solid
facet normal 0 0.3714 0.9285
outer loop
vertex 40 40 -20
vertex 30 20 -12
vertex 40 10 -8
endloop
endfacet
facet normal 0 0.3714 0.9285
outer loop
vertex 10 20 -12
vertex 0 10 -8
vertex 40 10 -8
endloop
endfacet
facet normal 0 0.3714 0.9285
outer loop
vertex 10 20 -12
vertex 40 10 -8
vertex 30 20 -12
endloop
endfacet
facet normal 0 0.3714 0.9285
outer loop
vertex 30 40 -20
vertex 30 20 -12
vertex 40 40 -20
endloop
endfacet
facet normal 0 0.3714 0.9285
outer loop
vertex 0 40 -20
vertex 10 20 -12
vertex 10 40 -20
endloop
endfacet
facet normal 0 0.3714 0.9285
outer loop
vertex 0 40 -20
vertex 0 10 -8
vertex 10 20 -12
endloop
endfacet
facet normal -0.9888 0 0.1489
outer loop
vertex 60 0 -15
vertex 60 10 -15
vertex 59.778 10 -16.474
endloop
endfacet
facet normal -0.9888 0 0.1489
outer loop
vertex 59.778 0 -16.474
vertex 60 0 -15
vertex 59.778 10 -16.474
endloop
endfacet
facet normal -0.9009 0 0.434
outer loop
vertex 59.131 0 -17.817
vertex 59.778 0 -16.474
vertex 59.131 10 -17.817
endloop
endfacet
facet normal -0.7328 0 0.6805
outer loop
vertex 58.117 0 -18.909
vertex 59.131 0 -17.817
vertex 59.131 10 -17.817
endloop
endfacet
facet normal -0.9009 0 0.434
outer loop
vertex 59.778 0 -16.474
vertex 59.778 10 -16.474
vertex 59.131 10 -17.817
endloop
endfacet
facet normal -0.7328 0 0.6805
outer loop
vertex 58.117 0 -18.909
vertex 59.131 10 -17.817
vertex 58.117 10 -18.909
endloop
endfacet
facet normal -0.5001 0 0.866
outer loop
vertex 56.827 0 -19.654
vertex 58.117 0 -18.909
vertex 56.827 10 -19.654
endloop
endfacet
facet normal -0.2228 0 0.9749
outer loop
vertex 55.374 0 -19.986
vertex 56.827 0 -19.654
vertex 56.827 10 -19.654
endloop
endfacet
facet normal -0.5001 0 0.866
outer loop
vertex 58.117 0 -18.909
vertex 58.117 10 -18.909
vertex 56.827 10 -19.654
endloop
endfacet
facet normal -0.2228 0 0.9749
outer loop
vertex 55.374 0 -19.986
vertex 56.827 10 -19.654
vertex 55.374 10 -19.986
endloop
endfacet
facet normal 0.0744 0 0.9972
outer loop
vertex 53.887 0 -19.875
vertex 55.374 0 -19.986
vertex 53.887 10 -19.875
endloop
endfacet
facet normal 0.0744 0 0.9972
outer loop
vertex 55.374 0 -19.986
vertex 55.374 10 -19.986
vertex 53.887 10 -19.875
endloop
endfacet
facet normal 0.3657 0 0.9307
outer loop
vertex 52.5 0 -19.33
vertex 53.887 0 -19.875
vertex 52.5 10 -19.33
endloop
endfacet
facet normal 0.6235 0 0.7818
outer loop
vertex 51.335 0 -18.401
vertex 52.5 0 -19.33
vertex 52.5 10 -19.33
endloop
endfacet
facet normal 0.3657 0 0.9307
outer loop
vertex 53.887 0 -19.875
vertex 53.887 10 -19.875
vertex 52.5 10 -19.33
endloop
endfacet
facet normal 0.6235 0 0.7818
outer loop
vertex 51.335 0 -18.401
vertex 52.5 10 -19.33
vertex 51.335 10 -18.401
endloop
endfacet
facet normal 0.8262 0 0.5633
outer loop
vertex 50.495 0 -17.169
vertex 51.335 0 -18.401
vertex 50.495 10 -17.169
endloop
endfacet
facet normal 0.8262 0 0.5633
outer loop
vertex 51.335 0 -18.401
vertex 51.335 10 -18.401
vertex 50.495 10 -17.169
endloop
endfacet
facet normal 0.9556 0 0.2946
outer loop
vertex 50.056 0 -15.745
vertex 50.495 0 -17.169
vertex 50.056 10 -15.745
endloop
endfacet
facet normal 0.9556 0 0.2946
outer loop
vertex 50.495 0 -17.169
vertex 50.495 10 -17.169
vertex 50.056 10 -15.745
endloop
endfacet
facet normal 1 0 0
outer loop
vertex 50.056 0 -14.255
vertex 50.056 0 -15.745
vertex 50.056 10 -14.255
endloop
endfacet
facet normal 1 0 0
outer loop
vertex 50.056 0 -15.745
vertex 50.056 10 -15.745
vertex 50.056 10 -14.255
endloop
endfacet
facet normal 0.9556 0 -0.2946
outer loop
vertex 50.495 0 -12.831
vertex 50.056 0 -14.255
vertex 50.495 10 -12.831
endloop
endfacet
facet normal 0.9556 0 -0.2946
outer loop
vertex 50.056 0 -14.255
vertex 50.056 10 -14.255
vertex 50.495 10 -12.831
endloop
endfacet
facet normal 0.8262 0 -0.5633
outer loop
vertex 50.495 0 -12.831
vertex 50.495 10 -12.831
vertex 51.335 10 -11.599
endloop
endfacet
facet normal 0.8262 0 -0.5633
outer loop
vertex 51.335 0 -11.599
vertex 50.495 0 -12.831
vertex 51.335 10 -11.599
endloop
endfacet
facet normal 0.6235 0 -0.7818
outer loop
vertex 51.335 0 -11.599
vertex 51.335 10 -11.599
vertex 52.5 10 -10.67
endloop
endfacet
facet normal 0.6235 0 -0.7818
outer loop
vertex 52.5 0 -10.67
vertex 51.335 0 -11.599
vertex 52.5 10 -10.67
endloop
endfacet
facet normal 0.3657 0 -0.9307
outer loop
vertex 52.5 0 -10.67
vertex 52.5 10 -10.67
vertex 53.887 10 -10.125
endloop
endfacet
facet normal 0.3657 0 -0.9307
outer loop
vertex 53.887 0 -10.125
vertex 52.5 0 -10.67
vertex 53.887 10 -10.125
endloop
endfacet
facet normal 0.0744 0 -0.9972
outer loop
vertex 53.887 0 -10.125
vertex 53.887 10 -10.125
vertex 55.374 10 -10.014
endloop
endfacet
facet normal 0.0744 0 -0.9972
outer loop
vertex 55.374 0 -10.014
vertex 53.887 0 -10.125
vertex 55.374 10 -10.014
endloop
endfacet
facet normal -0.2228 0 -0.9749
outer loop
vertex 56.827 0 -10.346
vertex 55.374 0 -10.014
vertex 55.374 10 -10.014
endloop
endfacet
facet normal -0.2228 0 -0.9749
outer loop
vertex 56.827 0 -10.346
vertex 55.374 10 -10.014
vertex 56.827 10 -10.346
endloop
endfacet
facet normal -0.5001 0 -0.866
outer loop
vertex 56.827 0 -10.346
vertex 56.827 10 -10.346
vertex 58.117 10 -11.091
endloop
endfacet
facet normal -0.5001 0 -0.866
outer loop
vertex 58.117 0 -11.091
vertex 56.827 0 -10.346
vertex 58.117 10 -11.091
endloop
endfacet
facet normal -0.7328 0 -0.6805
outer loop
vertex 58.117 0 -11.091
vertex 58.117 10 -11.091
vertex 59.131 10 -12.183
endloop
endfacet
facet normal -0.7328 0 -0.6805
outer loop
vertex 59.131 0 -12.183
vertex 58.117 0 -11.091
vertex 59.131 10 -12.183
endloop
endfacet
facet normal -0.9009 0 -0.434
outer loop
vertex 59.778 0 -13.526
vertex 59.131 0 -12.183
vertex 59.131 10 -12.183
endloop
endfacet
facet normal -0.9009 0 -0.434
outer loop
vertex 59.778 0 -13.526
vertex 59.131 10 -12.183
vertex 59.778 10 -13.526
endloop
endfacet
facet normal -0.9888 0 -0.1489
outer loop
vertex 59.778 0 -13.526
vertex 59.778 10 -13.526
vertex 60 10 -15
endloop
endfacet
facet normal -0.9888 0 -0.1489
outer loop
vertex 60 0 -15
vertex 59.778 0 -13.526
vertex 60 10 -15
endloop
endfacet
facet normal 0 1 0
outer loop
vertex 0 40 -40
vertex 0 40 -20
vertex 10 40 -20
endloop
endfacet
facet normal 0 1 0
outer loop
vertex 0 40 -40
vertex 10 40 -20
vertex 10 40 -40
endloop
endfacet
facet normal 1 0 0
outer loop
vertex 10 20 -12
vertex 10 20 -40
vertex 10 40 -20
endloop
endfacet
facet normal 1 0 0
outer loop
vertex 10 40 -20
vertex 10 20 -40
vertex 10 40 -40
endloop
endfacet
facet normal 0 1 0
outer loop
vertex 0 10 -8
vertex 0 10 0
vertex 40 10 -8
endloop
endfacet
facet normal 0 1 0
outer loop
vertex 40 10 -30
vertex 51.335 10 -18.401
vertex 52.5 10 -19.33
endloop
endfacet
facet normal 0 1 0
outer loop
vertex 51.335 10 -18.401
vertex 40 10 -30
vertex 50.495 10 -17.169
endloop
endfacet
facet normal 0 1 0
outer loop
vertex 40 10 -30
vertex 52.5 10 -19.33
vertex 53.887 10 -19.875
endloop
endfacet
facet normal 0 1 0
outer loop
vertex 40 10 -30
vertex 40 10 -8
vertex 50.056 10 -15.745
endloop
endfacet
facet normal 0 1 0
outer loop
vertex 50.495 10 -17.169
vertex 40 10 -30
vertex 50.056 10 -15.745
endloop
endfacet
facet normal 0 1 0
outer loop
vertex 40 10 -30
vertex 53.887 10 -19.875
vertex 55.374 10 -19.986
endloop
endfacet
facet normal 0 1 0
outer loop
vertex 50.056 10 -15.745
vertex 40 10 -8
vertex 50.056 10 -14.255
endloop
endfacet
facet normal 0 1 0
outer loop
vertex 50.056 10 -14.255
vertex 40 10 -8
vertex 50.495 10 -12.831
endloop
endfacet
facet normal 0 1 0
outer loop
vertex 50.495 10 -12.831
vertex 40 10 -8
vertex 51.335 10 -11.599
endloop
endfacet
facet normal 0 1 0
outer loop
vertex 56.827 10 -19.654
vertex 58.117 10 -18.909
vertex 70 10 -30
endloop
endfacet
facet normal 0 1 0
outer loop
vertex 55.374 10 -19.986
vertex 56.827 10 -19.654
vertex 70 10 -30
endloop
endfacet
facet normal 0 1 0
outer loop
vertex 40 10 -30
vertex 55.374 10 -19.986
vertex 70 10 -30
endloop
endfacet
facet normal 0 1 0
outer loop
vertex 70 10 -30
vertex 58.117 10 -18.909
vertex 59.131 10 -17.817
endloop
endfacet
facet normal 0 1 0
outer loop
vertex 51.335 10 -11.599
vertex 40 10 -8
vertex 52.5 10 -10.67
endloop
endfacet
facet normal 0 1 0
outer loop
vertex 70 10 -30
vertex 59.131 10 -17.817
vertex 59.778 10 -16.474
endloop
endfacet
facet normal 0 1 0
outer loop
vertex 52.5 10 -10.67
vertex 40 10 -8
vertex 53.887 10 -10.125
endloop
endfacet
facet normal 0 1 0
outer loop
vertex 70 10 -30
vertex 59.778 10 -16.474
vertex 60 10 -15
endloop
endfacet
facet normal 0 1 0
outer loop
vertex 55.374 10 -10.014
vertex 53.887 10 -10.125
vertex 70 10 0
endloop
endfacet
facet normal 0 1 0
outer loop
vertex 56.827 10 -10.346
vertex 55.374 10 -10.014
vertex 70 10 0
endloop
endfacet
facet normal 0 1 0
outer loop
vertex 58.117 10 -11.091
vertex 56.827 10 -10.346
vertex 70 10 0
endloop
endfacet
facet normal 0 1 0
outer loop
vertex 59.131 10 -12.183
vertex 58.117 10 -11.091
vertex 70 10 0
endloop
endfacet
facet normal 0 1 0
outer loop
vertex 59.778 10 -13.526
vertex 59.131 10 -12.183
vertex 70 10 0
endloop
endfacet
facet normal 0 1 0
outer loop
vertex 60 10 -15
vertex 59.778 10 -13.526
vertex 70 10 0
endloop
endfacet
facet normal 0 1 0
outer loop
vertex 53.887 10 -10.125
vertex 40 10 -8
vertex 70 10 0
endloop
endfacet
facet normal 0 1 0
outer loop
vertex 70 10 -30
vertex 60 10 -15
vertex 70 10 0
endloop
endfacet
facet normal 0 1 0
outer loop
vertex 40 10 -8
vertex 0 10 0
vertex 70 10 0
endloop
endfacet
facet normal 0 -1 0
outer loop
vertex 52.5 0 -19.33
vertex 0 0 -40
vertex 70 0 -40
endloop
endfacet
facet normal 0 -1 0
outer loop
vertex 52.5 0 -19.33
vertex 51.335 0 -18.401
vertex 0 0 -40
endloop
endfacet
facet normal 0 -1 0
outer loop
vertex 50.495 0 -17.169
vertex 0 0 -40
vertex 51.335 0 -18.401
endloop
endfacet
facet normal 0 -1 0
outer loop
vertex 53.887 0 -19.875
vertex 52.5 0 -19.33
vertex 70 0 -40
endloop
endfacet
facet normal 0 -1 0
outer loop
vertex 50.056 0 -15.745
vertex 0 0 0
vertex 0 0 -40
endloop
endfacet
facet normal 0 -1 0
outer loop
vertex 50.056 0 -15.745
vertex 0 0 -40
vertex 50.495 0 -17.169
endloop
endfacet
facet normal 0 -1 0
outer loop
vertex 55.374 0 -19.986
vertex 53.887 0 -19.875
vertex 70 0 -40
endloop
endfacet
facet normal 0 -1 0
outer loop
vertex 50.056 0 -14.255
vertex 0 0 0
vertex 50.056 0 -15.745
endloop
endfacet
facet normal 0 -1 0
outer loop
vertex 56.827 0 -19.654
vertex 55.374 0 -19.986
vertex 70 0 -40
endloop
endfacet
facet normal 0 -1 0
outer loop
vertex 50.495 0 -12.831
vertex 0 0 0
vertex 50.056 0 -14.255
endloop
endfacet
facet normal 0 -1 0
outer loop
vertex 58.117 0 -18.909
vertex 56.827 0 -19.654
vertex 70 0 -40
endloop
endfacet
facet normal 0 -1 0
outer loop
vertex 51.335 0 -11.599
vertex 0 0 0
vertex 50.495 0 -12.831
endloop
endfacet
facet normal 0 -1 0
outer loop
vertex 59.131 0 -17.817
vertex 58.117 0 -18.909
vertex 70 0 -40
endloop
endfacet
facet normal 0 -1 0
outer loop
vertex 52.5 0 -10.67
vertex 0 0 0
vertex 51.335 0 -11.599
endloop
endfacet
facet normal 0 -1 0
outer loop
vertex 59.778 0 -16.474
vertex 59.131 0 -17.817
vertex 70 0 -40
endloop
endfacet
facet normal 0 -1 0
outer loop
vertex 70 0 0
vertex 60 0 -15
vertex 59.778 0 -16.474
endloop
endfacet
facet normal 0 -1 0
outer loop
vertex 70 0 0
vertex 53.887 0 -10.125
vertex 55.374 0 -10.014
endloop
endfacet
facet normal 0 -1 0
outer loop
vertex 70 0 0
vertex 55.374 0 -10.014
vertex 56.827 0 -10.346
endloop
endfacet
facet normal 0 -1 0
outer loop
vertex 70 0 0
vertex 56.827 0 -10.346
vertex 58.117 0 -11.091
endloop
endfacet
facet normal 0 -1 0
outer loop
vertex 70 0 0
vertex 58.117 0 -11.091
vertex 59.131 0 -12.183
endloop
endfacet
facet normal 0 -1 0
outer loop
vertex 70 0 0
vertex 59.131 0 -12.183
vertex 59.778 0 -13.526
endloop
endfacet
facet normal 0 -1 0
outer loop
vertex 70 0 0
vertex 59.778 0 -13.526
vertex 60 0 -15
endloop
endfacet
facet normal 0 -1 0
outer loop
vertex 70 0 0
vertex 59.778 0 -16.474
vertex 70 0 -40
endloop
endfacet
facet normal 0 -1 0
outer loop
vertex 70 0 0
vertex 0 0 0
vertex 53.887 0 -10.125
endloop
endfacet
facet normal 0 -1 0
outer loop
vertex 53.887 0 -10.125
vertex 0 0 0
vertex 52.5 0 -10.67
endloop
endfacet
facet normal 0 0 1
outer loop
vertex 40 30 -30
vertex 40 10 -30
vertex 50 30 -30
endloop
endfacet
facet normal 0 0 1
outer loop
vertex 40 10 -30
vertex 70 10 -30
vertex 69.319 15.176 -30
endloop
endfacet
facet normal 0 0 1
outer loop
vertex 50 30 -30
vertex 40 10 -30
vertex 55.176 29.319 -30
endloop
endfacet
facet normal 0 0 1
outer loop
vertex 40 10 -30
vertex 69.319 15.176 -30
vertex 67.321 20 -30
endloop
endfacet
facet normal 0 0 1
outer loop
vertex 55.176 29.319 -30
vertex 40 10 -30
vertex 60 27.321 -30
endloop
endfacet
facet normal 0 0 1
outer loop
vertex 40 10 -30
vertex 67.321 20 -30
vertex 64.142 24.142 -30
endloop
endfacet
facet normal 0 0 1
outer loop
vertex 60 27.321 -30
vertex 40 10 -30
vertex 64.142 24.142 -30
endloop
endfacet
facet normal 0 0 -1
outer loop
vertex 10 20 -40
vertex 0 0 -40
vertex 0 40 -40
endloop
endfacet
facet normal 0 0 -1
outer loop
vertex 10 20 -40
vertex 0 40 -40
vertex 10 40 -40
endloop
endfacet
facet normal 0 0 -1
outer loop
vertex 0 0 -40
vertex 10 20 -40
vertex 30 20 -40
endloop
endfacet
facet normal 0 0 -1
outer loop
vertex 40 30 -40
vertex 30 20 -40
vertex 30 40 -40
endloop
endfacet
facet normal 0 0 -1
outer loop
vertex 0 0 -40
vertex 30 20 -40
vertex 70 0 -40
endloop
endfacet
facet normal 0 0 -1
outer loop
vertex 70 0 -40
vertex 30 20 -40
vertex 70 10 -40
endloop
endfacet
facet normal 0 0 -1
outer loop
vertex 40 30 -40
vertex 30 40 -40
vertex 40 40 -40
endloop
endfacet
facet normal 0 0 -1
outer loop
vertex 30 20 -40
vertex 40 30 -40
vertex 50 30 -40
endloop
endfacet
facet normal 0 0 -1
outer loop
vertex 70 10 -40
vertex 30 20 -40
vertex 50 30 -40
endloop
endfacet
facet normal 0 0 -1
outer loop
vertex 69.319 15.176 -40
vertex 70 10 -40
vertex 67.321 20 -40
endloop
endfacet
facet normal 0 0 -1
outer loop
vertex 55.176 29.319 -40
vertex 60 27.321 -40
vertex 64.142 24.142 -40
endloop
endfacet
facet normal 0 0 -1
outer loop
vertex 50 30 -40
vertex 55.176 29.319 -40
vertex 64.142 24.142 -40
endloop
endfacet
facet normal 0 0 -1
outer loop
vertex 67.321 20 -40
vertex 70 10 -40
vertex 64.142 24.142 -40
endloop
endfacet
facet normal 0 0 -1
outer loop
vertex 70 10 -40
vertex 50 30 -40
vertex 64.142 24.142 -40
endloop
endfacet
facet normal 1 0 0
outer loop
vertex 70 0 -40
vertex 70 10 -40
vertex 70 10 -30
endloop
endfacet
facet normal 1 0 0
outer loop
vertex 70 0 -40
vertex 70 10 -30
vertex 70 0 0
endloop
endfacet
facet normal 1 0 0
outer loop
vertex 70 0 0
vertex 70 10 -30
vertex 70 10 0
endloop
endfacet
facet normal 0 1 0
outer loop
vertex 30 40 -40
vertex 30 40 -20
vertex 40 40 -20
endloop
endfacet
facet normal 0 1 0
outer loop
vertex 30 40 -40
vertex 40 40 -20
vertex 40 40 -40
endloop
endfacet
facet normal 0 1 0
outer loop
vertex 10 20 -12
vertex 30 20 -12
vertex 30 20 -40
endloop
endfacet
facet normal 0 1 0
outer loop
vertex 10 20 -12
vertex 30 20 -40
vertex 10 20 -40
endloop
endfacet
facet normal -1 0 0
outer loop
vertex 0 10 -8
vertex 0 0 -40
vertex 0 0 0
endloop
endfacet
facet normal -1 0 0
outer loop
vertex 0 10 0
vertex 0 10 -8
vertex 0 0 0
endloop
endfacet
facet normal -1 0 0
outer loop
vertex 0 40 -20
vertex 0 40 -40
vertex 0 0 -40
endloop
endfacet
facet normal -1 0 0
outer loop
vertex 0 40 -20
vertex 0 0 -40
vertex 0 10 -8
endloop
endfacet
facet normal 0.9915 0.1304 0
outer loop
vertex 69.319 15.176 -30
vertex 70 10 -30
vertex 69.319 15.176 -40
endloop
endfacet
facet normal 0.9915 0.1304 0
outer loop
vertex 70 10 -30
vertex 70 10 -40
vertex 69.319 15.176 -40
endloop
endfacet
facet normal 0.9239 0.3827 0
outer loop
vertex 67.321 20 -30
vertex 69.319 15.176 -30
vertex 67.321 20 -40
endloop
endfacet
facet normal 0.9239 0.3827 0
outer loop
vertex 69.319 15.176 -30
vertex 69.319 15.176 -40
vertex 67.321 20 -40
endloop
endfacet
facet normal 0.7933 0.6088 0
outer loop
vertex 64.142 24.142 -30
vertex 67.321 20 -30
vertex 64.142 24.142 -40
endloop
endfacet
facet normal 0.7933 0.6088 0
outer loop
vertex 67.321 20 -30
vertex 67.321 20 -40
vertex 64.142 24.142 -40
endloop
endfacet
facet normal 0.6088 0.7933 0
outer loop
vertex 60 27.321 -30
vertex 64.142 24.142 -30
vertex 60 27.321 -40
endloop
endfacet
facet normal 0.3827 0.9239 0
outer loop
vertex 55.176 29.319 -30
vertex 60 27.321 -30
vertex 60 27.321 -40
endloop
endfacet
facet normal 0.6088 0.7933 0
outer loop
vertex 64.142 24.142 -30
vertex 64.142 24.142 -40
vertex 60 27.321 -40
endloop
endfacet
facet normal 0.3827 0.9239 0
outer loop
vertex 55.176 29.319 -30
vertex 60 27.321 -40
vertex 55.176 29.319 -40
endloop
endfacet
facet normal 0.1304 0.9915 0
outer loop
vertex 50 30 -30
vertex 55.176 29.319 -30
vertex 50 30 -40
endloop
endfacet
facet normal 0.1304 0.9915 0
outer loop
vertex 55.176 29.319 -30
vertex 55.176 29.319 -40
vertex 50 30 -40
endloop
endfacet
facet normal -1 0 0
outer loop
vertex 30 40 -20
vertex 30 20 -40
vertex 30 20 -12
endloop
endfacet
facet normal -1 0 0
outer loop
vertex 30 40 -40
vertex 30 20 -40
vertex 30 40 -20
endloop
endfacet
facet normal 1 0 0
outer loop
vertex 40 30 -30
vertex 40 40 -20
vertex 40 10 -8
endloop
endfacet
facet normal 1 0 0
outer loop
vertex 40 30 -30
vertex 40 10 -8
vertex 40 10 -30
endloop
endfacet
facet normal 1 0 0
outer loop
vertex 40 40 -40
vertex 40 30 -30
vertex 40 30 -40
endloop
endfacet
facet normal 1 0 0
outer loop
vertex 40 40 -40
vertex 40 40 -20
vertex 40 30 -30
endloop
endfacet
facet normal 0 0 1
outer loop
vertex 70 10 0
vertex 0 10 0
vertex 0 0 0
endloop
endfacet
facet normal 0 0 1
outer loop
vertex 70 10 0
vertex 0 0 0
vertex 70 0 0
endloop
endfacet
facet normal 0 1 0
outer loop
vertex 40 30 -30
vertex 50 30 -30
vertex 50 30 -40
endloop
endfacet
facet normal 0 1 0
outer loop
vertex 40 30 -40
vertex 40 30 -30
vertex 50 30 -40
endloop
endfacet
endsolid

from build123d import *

# Parameters (mm, degrees)
BOSS_EXTRUDE1_DEPTH            = 40
SKETCH2_W                      = 40
SKETCH2_H                      = 30
BOSS_EXTRUDE2_DEPTH            = 20
BOSS_EXTRUDE3_DEPTH            = 30
CUT_EXTRUDE1_DEPTH             = 30
SKETCH5_W                      = 70
SKETCH5_H                      = 40
BOSS_EXTRUDE4_DEPTH            = 10
SKETCH6_W                      = 20
SKETCH6_H                      = 20
CUT_EXTRUDE2_DEPTH             = 41
F_10_0_10_DIAMETER_HOLE1_D     = 10
F_10_0_10_DIAMETER_HOLE1_DEPTH = 40
FILLET1_R                      = 20


with BuildPart() as part:
    # Sketch1 → Boss-Extrude1 (new body)
    with BuildSketch(Plane(origin=(0, 0, 0), x_dir=(0, -1, 0), z_dir=(-1, 0, 0))):
        Polygon((-10, -8), (-40, -20), (-10, -20), align=None)
    extrude(amount=-BOSS_EXTRUDE1_DEPTH)

    # Sketch2 → Boss-Extrude2 (add)
    with BuildSketch(Plane(origin=(0, 0, -20), x_dir=(-1, 0, 0), z_dir=(0, 0, -1))):
        with Locations((-20, 25)):
            Rectangle(SKETCH2_W, SKETCH2_H)
    extrude(amount=BOSS_EXTRUDE2_DEPTH)

    # Sketch3 → Boss-Extrude3 (add)
    with BuildSketch(Plane(origin=(40, 0, 0), x_dir=(0, 0, -1), z_dir=(1, 0, 0))):
        Polygon((40, 10), (0, 10), (20, 40), (40, 40), align=None)
    extrude(amount=BOSS_EXTRUDE3_DEPTH)

    # Sketch4 → Cut-Extrude1 (cut)
    with BuildSketch(Plane(origin=(70, 0, 0), x_dir=(0, 0, -1), z_dir=(1, 0, 0))):
        Polygon((20, 40), (0, 10), (30, 10), (30, 30), (40, 30), (40, 40), align=None)
    extrude(amount=-CUT_EXTRUDE1_DEPTH, mode=Mode.SUBTRACT)

    # Sketch5 → Boss-Extrude4 (add)
    with BuildSketch(Plane.XZ.offset(-10)):
        with Locations((35, -20)):
            Rectangle(SKETCH5_W, SKETCH5_H)
    extrude(amount=BOSS_EXTRUDE4_DEPTH)

    # Sketch6 → Cut-Extrude2 (cut, through all)
    with BuildSketch(Plane(origin=(0, 0, -40), x_dir=(-1, 0, 0), z_dir=(0, 0, -1))):
        with Locations((-20, 30)):
            Rectangle(SKETCH6_W, SKETCH6_H)
    extrude(amount=-CUT_EXTRUDE2_DEPTH, mode=Mode.SUBTRACT)

    # Ø10.0 (10) Diameter Hole1
    with Locations(Plane(origin=(0, 0, 0), x_dir=(-1, 0, 0), z_dir=(0, -1, 0))):
        with Locations((-55, 15)):
            Hole(F_10_0_10_DIAMETER_HOLE1_D / 2, depth=F_10_0_10_DIAMETER_HOLE1_DEPTH)

    # Fillet1
    fillet1_edges = [part.edges().sort_by_distance(p)[0] for p in [
        (70, 30, -35),
    ]]
    fillet(fillet1_edges, radius=FILLET1_R)


solid = part.part
